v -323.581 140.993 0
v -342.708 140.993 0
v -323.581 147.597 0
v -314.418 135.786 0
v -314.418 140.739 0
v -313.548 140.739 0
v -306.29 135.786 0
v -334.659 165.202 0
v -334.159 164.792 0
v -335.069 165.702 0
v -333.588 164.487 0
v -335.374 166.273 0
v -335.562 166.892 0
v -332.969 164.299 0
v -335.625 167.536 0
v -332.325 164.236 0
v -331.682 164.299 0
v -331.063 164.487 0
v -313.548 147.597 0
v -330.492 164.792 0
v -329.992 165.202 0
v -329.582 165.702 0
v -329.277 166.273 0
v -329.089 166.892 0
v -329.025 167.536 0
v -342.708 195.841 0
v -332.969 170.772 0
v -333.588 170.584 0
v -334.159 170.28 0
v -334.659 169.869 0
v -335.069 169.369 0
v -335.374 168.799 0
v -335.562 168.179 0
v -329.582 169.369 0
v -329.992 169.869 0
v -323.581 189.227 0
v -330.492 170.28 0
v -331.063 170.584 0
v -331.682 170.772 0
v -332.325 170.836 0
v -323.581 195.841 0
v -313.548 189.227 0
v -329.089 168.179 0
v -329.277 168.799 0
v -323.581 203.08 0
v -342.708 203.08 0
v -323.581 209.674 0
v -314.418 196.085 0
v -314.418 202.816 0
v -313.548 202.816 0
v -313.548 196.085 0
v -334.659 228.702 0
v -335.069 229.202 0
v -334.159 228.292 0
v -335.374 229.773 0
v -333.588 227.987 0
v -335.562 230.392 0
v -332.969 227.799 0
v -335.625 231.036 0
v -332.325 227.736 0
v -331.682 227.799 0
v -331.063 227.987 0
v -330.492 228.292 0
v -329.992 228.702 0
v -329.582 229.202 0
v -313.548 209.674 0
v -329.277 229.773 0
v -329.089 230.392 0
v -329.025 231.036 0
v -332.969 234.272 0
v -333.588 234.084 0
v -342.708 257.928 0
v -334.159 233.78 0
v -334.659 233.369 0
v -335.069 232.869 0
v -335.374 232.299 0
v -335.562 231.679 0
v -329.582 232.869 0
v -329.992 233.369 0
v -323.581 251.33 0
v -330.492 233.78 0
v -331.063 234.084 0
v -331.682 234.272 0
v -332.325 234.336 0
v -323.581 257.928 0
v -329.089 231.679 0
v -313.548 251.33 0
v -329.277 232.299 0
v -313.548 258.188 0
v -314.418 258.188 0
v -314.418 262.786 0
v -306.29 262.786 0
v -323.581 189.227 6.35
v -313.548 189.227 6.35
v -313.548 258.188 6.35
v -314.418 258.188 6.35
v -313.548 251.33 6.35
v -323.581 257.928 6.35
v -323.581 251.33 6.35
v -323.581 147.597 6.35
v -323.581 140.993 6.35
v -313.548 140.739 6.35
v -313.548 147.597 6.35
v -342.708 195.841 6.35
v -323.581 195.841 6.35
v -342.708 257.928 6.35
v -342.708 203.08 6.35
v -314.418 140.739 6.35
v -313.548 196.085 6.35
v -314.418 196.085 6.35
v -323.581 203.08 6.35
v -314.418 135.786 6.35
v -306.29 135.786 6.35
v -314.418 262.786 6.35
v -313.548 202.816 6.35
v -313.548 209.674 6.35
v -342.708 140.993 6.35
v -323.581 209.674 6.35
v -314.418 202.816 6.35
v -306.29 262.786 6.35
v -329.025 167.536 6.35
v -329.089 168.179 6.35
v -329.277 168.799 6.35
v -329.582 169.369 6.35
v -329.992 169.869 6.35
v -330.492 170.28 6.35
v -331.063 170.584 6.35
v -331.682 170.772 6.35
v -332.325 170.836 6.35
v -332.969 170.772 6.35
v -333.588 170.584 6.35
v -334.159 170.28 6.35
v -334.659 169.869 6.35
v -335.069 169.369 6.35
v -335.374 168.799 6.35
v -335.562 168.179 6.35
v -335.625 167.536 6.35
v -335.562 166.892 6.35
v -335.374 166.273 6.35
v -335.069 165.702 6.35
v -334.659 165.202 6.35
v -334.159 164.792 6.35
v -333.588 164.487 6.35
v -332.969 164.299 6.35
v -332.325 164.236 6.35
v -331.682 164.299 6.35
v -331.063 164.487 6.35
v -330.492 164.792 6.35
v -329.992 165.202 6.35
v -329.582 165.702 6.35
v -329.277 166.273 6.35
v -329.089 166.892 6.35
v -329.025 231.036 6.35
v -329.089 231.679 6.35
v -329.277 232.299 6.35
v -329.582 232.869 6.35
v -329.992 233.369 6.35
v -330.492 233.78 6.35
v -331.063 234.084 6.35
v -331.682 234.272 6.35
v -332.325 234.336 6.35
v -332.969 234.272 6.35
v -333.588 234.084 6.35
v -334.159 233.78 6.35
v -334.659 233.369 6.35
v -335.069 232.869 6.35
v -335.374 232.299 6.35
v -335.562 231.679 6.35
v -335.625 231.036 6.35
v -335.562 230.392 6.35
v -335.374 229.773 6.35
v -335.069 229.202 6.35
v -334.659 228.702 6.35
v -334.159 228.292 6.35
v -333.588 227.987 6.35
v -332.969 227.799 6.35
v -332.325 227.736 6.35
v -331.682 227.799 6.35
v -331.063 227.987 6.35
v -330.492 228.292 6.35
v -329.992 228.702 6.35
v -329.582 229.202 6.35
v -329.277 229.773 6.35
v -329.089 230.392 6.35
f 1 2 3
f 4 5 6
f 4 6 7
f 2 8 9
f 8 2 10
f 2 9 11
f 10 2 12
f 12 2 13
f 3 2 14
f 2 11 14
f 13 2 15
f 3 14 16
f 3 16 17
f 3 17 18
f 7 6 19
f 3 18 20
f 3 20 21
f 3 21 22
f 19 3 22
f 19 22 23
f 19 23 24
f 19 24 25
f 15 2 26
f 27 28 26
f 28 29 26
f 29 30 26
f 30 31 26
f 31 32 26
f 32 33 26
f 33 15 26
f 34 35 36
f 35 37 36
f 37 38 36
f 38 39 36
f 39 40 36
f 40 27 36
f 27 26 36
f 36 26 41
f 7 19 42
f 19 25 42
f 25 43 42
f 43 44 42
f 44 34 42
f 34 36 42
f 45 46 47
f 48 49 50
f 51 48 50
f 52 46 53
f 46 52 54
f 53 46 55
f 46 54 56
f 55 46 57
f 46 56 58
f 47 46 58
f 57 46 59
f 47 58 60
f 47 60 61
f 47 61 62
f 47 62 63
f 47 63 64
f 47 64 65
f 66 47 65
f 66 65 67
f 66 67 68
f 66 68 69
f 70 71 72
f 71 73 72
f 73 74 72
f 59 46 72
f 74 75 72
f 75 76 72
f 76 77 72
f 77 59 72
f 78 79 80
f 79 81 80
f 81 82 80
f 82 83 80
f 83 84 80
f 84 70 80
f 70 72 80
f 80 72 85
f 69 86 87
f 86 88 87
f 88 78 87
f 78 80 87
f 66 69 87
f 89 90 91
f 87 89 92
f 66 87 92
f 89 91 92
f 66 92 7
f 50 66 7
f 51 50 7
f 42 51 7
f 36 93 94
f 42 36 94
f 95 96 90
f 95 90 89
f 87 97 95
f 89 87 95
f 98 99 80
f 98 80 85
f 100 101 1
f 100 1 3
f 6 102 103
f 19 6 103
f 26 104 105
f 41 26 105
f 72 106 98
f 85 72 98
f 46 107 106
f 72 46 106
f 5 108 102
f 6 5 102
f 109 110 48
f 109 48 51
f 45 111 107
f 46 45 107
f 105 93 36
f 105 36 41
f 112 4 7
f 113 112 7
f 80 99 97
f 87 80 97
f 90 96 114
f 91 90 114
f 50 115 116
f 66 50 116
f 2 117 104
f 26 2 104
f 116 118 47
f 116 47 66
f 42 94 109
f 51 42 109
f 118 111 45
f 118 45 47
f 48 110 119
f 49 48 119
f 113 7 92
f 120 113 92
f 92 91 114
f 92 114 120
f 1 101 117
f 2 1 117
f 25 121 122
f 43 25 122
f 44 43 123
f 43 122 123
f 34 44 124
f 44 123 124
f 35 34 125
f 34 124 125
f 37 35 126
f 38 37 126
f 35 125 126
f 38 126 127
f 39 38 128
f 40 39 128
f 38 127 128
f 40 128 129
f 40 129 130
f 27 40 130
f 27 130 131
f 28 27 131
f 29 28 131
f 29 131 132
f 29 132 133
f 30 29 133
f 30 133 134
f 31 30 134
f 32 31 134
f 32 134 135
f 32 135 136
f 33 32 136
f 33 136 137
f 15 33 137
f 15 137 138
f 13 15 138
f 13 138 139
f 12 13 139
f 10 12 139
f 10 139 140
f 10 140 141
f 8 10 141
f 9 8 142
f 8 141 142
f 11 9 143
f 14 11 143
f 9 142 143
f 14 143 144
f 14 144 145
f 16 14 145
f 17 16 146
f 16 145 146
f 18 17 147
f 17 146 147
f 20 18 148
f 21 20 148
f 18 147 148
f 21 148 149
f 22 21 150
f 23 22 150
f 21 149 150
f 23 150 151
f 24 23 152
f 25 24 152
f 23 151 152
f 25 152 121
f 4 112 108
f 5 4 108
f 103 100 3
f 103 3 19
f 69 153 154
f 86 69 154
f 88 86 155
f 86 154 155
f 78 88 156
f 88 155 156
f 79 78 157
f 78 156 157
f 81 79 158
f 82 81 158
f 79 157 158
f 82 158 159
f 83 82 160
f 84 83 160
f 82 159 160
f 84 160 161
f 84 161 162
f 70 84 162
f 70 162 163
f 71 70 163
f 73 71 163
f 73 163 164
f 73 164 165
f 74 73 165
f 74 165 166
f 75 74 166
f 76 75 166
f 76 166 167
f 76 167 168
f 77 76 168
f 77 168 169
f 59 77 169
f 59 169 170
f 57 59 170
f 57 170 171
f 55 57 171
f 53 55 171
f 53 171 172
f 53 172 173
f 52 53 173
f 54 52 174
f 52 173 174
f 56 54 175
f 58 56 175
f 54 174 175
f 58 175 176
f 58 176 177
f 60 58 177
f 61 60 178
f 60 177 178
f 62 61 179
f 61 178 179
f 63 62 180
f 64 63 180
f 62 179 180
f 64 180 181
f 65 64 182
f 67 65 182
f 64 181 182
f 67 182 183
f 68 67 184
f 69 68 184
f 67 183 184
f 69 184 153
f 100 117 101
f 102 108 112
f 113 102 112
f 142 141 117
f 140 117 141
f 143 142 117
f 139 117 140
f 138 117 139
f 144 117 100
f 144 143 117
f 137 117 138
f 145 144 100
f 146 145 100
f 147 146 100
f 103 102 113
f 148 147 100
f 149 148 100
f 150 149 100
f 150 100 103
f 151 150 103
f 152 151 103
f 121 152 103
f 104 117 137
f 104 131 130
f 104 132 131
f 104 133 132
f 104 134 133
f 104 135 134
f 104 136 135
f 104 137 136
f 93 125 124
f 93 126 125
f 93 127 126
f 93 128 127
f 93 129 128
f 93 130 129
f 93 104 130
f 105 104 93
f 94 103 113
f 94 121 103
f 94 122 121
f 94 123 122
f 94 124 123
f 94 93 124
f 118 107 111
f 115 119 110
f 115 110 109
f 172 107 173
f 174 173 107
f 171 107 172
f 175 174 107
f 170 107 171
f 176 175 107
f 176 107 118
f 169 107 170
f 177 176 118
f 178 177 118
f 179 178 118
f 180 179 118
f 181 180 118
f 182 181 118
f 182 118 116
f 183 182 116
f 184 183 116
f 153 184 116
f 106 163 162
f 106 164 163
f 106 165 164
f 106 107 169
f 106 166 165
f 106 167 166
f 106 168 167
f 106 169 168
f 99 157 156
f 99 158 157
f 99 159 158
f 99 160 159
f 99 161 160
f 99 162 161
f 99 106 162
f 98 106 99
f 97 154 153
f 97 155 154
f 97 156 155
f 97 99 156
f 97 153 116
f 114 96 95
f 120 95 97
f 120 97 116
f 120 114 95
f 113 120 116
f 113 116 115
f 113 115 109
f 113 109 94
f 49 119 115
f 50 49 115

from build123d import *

# Parameters (mm, degrees)
SKETCH2_W               = 41.91
SKETCH2_H               = 190.436
BOSS_EXTRUDE1_DEPTH     = 6.35
SKETCH3_R               = 3.3
CUT_EXTRUDE1_DEPTH      = 478.183864302
SKETCH4_W               = 10.033
SKETCH4_H               = 6.858
CUT_EXTRUDE2_DEPTH      = 474.191260281
CUT_EXTRUDE3_DEPTH      = 474.191260281
CUT_EXTRUDE3_DEPTH_BACK = 474.191260281
SKETCH5_R               = 3.3


with BuildPart() as part:
    # Sketch2 → Boss-Extrude1 (new body)
    with BuildSketch(Plane.XY):
        with Locations((-327.245441571, 231.003658294)):
            Rectangle(SKETCH2_W, SKETCH2_H)
    extrude(amount=BOSS_EXTRUDE1_DEPTH)

    # Sketch3 → Cut-Extrude1 (cut, through all)
    with BuildSketch(Plane.XY.offset(6.35)):
        Polygon((-314.418441571, 195.840658294), (-314.418441571, 203.079658294), (-342.708441633, 203.079658294), (-342.708441633, 257.927658294), (-314.418441571, 257.927658294), (-314.418441571, 265.166658294), (-342.708441633, 265.166658294), (-342.708441633, 321.014658294), (-314.418441571, 321.014658294), (-314.418441571, 326.221658294), (-348.200441571, 326.221658294), (-348.200441571, 135.785658294), (-314.418441571, 135.785658294), (-314.418441571, 140.992658294), (-342.708441633, 140.992658294), (-342.708441633, 195.840658294), align=None)
        with Locations((-332.325441571, 294.535658294)):
            Circle(SKETCH3_R)
        with Locations((-332.325441571, 231.035658294)):
            Circle(SKETCH3_R)
        with Locations((-332.325441571, 167.535658294)):
            Circle(SKETCH3_R)
    extrude(amount=-CUT_EXTRUDE1_DEPTH, mode=Mode.SUBTRACT)

    # Sketch4 → Cut-Extrude2 (cut, through all)
    with BuildSketch(Plane.XY.offset(6.35)):
        with Locations((-318.564971808, 144.167658294)):
            Rectangle(SKETCH4_W, SKETCH4_H)
        with Locations((-318.564971808, 192.656258294)):
            Rectangle(SKETCH4_W, SKETCH4_H)
        with Locations((-318.564971808, 206.245258294)):
            Rectangle(SKETCH4_W, SKETCH4_H)
        with Locations((-318.564971808, 254.759258294)):
            Rectangle(SKETCH4_W, SKETCH4_H)
        with Locations((-318.564971808, 268.348258294)):
            Rectangle(SKETCH4_W, SKETCH4_H)
        with Locations((-318.564971808, 317.852858294)):
            Rectangle(SKETCH4_W, SKETCH4_H)
    extrude(amount=-CUT_EXTRUDE2_DEPTH, mode=Mode.SUBTRACT)

    # Sketch5 → Cut-Extrude3 (cut, two sides: drawn at the far end of the back side and taken through both)
    with BuildSketch(Plane.XY.offset(6.35).offset(-CUT_EXTRUDE3_DEPTH_BACK)):
        Polygon((-314.418441571, 264.919258294), (-314.418441571, 262.785658294), (-306.290441571, 262.785658294), (-306.290441571, 326.221658294), (-314.418441571, 326.221658294), (-314.418441571, 321.281858294), (-313.548471808, 321.281858294), (-313.548471808, 314.423858294), (-323.581471808, 314.423858294), (-323.581471808, 321.014658294), (-342.708441633, 321.014658294), (-342.708441633, 265.166658294), (-323.581471808, 265.166658294), (-323.581471808, 271.777258294), (-313.548471808, 271.777258294), (-313.548471808, 264.919258294), align=None)
        with Locations((-332.325441571, 294.535658294)):
            Circle(SKETCH5_R, mode=Mode.SUBTRACT)
    extrude(amount=CUT_EXTRUDE3_DEPTH + CUT_EXTRUDE3_DEPTH_BACK, mode=Mode.SUBTRACT)


solid = part.part
